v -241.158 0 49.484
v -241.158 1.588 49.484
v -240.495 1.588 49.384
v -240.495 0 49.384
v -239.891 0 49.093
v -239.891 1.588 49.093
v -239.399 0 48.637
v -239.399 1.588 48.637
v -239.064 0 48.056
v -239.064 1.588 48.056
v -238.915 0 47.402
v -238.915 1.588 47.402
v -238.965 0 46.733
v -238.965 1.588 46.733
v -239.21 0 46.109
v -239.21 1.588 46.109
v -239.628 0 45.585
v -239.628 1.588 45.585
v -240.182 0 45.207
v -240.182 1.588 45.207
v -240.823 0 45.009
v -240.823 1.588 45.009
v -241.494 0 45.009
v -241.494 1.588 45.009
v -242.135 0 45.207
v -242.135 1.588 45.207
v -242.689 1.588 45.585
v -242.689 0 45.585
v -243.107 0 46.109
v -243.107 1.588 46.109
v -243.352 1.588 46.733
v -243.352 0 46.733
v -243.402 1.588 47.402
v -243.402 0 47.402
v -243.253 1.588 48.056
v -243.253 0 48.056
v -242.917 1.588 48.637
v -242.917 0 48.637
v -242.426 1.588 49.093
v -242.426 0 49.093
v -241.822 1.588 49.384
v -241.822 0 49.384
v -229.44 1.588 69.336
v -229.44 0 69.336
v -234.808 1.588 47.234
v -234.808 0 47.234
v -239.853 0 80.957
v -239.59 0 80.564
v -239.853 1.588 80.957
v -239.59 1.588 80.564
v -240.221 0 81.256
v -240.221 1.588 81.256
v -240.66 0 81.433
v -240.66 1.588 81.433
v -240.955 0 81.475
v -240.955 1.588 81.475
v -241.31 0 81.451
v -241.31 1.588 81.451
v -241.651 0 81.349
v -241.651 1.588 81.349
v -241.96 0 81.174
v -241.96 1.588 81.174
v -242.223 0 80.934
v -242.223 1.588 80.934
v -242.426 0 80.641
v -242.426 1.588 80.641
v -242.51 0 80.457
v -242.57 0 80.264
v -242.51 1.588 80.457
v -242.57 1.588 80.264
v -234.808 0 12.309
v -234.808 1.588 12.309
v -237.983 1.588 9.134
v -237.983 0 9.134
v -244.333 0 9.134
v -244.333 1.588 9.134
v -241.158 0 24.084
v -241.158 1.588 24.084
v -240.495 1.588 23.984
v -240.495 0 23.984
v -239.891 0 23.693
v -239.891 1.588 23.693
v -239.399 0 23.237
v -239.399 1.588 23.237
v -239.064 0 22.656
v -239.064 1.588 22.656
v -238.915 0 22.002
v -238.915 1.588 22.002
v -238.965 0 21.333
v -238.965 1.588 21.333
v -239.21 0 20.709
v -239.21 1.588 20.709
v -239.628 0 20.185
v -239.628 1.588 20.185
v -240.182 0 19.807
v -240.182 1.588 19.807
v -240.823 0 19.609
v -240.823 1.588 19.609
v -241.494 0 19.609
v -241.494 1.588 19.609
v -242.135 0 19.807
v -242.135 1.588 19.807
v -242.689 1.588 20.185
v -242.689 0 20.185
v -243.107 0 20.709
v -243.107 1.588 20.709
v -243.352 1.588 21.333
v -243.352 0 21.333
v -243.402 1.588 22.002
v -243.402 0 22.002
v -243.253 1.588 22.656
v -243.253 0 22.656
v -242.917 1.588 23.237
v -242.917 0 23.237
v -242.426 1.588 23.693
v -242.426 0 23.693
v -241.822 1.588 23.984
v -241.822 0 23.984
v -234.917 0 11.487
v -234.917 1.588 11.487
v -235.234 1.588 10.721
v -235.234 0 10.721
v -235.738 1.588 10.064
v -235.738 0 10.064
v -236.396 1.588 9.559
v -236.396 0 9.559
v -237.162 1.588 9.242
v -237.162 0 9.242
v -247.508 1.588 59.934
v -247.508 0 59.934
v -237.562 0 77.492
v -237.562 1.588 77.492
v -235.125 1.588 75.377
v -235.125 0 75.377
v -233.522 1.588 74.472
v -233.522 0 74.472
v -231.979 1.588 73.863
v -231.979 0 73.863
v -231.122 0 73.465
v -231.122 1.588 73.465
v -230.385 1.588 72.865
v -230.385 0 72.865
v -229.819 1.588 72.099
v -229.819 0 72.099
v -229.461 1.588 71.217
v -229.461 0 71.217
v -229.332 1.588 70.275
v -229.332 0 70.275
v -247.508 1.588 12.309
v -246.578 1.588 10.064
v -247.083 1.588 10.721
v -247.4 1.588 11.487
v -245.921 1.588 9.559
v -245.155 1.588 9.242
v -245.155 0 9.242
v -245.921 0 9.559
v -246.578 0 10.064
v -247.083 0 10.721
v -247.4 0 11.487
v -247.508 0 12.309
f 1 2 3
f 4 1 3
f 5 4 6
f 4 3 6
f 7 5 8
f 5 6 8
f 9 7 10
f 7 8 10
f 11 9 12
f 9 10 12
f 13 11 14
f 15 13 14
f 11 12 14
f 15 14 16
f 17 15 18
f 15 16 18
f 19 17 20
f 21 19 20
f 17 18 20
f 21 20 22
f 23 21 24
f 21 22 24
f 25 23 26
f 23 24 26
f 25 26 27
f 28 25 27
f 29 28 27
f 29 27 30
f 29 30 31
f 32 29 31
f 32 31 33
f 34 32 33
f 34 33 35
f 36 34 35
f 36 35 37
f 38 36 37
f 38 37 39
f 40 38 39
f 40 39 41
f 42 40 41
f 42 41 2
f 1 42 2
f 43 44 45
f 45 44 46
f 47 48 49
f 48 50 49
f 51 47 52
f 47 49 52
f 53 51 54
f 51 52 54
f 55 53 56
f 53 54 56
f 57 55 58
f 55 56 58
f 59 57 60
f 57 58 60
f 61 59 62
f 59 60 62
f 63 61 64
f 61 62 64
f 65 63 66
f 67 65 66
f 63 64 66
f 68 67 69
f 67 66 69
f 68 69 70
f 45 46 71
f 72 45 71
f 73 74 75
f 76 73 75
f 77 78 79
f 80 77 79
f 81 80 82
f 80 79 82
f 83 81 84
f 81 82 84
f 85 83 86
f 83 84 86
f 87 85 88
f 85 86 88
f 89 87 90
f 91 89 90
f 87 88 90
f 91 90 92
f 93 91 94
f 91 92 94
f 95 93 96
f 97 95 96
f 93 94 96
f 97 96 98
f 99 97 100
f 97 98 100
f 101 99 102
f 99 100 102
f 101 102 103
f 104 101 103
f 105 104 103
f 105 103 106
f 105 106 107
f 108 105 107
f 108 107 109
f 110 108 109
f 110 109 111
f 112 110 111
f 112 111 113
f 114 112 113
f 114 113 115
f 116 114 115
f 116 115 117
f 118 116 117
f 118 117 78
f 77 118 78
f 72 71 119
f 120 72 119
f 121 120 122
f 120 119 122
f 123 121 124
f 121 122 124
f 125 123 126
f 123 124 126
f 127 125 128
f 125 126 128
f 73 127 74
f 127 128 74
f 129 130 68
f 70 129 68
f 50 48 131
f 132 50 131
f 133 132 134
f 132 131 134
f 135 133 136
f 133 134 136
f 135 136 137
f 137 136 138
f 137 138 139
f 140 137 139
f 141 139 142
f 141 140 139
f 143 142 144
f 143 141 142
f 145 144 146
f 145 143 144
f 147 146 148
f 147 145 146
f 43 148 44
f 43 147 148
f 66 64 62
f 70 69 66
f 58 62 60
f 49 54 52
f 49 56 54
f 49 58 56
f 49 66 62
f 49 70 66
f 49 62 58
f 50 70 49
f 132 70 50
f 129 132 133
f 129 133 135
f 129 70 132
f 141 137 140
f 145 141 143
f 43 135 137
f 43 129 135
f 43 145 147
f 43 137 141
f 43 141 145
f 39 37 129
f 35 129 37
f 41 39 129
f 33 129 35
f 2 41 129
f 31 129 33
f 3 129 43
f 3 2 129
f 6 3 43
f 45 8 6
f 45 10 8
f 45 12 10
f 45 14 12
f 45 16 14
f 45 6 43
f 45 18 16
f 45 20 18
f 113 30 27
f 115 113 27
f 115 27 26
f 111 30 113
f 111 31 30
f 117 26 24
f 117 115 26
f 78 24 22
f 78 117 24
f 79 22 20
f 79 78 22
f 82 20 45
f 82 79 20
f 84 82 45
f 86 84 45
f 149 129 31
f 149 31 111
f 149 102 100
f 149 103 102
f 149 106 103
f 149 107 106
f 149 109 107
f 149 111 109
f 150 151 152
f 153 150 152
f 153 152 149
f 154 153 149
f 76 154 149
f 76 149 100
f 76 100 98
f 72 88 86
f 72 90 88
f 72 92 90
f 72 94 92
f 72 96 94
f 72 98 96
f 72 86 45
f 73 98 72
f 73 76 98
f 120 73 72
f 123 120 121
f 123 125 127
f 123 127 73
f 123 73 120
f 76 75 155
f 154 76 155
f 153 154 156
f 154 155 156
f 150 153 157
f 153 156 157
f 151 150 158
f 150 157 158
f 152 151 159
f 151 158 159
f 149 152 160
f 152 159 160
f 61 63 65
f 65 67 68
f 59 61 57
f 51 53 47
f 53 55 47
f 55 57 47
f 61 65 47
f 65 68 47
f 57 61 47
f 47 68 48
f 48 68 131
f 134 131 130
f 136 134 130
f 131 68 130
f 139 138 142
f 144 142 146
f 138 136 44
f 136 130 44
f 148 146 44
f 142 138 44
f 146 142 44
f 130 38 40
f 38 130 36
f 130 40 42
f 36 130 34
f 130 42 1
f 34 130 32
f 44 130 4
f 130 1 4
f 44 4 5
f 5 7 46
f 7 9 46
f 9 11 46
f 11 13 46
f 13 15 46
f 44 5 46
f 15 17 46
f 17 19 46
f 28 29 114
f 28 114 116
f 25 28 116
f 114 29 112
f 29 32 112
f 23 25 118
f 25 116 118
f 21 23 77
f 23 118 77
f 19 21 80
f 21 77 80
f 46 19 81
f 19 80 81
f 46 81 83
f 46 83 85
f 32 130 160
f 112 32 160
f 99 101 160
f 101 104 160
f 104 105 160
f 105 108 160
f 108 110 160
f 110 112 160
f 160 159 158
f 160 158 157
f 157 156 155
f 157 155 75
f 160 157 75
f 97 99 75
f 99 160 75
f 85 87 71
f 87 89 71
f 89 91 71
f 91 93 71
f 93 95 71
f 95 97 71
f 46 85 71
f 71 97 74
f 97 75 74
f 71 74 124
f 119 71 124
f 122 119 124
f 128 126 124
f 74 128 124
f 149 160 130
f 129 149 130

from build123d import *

# Parameters (mm, degrees)
BOSS_EXTRUDE1_DEPTH = 1.5875
FILLET1_R           = 3.81
FILLET2_R           = 1.5875
SKETCH8_R           = 2.25
CUT_EXTRUDE1_DEPTH  = 3.175


with BuildPart() as part:
    # Sketch1 → Boss-Extrude1 (new body)
    with BuildSketch(Plane(origin=(0, 0, 0), x_dir=(1, 0, 0), z_dir=(0, 1, 0))):
        with BuildLine():
            Line((-247.50833587, -59.933994147), (-240.439659658, -89.034683934))
            add(Edge.make_bspline(
                [(-240.439659658, -89.034683934), (-242.558073639, -80.3134883), (-236.877012866, -74.608932784), (-230.317813562, -73.452368974), (-229.725859184, -73.347991446), (-229.113793878, -73.283589588), (-228.485146838, -73.26562397)],
                knots=[0.241984005, 0.241984005, 0.241984005, 0.241984005, 0.5, 0.5, 0.5, 0.533893072, 0.533893072, 0.533893072, 0.533893072], degree=3, weights=[0.500514049, 0.489483356, 0.655978673, 1, 0.954809238, 0.912681783, 0.873617635]))
            Line((-228.485146838, -73.26562397), (-234.80833587, -47.233994147))
            Line((-234.80833587, -47.233994147), (-234.80833587, -12.308994147))
            ThreePointArc((-234.80833587, -12.308994147), (-235.738271839, -10.063930117), (-237.98333587, -9.133994147))
            Line((-237.98333587, -9.133994147), (-244.33333587, -9.133994147))
            ThreePointArc((-244.33333587, -9.133994147), (-246.5783999, -10.063930117), (-247.50833587, -12.308994147))
            Line((-247.50833587, -12.308994147), (-247.50833587, -59.933994147))
        make_face()
    extrude(amount=BOSS_EXTRUDE1_DEPTH)

    # Fillet1
    fillet1_edges = [part.edges().sort_by_distance(p)[0] for p in [
        (-228.485146838, 0.79375, 73.26562397),
    ]]
    fillet(fillet1_edges, radius=FILLET1_R)

    # Fillet2
    fillet2_edges = [part.edges().sort_by_distance(p)[0] for p in [
        (-240.439659658, 0.79375, 89.034683934),
    ]]
    fillet(fillet2_edges, radius=FILLET2_R)

    # Sketch8 → Cut-Extrude1 (cut)
    with BuildSketch(Plane(origin=(0, 1.5875, 0), x_dir=(1, 0, 0), z_dir=(0, 1, 0))):
        with Locations(Location((-241.15833587, -21.833994147, 0), (0, 0, 270))):
            Circle(SKETCH8_R)
        with Locations(Location((-241.15833587, -47.233994147, 0), (0, 0, 270))):
            Circle(SKETCH8_R)
    extrude(amount=-CUT_EXTRUDE1_DEPTH, mode=Mode.SUBTRACT)


solid = part.part
